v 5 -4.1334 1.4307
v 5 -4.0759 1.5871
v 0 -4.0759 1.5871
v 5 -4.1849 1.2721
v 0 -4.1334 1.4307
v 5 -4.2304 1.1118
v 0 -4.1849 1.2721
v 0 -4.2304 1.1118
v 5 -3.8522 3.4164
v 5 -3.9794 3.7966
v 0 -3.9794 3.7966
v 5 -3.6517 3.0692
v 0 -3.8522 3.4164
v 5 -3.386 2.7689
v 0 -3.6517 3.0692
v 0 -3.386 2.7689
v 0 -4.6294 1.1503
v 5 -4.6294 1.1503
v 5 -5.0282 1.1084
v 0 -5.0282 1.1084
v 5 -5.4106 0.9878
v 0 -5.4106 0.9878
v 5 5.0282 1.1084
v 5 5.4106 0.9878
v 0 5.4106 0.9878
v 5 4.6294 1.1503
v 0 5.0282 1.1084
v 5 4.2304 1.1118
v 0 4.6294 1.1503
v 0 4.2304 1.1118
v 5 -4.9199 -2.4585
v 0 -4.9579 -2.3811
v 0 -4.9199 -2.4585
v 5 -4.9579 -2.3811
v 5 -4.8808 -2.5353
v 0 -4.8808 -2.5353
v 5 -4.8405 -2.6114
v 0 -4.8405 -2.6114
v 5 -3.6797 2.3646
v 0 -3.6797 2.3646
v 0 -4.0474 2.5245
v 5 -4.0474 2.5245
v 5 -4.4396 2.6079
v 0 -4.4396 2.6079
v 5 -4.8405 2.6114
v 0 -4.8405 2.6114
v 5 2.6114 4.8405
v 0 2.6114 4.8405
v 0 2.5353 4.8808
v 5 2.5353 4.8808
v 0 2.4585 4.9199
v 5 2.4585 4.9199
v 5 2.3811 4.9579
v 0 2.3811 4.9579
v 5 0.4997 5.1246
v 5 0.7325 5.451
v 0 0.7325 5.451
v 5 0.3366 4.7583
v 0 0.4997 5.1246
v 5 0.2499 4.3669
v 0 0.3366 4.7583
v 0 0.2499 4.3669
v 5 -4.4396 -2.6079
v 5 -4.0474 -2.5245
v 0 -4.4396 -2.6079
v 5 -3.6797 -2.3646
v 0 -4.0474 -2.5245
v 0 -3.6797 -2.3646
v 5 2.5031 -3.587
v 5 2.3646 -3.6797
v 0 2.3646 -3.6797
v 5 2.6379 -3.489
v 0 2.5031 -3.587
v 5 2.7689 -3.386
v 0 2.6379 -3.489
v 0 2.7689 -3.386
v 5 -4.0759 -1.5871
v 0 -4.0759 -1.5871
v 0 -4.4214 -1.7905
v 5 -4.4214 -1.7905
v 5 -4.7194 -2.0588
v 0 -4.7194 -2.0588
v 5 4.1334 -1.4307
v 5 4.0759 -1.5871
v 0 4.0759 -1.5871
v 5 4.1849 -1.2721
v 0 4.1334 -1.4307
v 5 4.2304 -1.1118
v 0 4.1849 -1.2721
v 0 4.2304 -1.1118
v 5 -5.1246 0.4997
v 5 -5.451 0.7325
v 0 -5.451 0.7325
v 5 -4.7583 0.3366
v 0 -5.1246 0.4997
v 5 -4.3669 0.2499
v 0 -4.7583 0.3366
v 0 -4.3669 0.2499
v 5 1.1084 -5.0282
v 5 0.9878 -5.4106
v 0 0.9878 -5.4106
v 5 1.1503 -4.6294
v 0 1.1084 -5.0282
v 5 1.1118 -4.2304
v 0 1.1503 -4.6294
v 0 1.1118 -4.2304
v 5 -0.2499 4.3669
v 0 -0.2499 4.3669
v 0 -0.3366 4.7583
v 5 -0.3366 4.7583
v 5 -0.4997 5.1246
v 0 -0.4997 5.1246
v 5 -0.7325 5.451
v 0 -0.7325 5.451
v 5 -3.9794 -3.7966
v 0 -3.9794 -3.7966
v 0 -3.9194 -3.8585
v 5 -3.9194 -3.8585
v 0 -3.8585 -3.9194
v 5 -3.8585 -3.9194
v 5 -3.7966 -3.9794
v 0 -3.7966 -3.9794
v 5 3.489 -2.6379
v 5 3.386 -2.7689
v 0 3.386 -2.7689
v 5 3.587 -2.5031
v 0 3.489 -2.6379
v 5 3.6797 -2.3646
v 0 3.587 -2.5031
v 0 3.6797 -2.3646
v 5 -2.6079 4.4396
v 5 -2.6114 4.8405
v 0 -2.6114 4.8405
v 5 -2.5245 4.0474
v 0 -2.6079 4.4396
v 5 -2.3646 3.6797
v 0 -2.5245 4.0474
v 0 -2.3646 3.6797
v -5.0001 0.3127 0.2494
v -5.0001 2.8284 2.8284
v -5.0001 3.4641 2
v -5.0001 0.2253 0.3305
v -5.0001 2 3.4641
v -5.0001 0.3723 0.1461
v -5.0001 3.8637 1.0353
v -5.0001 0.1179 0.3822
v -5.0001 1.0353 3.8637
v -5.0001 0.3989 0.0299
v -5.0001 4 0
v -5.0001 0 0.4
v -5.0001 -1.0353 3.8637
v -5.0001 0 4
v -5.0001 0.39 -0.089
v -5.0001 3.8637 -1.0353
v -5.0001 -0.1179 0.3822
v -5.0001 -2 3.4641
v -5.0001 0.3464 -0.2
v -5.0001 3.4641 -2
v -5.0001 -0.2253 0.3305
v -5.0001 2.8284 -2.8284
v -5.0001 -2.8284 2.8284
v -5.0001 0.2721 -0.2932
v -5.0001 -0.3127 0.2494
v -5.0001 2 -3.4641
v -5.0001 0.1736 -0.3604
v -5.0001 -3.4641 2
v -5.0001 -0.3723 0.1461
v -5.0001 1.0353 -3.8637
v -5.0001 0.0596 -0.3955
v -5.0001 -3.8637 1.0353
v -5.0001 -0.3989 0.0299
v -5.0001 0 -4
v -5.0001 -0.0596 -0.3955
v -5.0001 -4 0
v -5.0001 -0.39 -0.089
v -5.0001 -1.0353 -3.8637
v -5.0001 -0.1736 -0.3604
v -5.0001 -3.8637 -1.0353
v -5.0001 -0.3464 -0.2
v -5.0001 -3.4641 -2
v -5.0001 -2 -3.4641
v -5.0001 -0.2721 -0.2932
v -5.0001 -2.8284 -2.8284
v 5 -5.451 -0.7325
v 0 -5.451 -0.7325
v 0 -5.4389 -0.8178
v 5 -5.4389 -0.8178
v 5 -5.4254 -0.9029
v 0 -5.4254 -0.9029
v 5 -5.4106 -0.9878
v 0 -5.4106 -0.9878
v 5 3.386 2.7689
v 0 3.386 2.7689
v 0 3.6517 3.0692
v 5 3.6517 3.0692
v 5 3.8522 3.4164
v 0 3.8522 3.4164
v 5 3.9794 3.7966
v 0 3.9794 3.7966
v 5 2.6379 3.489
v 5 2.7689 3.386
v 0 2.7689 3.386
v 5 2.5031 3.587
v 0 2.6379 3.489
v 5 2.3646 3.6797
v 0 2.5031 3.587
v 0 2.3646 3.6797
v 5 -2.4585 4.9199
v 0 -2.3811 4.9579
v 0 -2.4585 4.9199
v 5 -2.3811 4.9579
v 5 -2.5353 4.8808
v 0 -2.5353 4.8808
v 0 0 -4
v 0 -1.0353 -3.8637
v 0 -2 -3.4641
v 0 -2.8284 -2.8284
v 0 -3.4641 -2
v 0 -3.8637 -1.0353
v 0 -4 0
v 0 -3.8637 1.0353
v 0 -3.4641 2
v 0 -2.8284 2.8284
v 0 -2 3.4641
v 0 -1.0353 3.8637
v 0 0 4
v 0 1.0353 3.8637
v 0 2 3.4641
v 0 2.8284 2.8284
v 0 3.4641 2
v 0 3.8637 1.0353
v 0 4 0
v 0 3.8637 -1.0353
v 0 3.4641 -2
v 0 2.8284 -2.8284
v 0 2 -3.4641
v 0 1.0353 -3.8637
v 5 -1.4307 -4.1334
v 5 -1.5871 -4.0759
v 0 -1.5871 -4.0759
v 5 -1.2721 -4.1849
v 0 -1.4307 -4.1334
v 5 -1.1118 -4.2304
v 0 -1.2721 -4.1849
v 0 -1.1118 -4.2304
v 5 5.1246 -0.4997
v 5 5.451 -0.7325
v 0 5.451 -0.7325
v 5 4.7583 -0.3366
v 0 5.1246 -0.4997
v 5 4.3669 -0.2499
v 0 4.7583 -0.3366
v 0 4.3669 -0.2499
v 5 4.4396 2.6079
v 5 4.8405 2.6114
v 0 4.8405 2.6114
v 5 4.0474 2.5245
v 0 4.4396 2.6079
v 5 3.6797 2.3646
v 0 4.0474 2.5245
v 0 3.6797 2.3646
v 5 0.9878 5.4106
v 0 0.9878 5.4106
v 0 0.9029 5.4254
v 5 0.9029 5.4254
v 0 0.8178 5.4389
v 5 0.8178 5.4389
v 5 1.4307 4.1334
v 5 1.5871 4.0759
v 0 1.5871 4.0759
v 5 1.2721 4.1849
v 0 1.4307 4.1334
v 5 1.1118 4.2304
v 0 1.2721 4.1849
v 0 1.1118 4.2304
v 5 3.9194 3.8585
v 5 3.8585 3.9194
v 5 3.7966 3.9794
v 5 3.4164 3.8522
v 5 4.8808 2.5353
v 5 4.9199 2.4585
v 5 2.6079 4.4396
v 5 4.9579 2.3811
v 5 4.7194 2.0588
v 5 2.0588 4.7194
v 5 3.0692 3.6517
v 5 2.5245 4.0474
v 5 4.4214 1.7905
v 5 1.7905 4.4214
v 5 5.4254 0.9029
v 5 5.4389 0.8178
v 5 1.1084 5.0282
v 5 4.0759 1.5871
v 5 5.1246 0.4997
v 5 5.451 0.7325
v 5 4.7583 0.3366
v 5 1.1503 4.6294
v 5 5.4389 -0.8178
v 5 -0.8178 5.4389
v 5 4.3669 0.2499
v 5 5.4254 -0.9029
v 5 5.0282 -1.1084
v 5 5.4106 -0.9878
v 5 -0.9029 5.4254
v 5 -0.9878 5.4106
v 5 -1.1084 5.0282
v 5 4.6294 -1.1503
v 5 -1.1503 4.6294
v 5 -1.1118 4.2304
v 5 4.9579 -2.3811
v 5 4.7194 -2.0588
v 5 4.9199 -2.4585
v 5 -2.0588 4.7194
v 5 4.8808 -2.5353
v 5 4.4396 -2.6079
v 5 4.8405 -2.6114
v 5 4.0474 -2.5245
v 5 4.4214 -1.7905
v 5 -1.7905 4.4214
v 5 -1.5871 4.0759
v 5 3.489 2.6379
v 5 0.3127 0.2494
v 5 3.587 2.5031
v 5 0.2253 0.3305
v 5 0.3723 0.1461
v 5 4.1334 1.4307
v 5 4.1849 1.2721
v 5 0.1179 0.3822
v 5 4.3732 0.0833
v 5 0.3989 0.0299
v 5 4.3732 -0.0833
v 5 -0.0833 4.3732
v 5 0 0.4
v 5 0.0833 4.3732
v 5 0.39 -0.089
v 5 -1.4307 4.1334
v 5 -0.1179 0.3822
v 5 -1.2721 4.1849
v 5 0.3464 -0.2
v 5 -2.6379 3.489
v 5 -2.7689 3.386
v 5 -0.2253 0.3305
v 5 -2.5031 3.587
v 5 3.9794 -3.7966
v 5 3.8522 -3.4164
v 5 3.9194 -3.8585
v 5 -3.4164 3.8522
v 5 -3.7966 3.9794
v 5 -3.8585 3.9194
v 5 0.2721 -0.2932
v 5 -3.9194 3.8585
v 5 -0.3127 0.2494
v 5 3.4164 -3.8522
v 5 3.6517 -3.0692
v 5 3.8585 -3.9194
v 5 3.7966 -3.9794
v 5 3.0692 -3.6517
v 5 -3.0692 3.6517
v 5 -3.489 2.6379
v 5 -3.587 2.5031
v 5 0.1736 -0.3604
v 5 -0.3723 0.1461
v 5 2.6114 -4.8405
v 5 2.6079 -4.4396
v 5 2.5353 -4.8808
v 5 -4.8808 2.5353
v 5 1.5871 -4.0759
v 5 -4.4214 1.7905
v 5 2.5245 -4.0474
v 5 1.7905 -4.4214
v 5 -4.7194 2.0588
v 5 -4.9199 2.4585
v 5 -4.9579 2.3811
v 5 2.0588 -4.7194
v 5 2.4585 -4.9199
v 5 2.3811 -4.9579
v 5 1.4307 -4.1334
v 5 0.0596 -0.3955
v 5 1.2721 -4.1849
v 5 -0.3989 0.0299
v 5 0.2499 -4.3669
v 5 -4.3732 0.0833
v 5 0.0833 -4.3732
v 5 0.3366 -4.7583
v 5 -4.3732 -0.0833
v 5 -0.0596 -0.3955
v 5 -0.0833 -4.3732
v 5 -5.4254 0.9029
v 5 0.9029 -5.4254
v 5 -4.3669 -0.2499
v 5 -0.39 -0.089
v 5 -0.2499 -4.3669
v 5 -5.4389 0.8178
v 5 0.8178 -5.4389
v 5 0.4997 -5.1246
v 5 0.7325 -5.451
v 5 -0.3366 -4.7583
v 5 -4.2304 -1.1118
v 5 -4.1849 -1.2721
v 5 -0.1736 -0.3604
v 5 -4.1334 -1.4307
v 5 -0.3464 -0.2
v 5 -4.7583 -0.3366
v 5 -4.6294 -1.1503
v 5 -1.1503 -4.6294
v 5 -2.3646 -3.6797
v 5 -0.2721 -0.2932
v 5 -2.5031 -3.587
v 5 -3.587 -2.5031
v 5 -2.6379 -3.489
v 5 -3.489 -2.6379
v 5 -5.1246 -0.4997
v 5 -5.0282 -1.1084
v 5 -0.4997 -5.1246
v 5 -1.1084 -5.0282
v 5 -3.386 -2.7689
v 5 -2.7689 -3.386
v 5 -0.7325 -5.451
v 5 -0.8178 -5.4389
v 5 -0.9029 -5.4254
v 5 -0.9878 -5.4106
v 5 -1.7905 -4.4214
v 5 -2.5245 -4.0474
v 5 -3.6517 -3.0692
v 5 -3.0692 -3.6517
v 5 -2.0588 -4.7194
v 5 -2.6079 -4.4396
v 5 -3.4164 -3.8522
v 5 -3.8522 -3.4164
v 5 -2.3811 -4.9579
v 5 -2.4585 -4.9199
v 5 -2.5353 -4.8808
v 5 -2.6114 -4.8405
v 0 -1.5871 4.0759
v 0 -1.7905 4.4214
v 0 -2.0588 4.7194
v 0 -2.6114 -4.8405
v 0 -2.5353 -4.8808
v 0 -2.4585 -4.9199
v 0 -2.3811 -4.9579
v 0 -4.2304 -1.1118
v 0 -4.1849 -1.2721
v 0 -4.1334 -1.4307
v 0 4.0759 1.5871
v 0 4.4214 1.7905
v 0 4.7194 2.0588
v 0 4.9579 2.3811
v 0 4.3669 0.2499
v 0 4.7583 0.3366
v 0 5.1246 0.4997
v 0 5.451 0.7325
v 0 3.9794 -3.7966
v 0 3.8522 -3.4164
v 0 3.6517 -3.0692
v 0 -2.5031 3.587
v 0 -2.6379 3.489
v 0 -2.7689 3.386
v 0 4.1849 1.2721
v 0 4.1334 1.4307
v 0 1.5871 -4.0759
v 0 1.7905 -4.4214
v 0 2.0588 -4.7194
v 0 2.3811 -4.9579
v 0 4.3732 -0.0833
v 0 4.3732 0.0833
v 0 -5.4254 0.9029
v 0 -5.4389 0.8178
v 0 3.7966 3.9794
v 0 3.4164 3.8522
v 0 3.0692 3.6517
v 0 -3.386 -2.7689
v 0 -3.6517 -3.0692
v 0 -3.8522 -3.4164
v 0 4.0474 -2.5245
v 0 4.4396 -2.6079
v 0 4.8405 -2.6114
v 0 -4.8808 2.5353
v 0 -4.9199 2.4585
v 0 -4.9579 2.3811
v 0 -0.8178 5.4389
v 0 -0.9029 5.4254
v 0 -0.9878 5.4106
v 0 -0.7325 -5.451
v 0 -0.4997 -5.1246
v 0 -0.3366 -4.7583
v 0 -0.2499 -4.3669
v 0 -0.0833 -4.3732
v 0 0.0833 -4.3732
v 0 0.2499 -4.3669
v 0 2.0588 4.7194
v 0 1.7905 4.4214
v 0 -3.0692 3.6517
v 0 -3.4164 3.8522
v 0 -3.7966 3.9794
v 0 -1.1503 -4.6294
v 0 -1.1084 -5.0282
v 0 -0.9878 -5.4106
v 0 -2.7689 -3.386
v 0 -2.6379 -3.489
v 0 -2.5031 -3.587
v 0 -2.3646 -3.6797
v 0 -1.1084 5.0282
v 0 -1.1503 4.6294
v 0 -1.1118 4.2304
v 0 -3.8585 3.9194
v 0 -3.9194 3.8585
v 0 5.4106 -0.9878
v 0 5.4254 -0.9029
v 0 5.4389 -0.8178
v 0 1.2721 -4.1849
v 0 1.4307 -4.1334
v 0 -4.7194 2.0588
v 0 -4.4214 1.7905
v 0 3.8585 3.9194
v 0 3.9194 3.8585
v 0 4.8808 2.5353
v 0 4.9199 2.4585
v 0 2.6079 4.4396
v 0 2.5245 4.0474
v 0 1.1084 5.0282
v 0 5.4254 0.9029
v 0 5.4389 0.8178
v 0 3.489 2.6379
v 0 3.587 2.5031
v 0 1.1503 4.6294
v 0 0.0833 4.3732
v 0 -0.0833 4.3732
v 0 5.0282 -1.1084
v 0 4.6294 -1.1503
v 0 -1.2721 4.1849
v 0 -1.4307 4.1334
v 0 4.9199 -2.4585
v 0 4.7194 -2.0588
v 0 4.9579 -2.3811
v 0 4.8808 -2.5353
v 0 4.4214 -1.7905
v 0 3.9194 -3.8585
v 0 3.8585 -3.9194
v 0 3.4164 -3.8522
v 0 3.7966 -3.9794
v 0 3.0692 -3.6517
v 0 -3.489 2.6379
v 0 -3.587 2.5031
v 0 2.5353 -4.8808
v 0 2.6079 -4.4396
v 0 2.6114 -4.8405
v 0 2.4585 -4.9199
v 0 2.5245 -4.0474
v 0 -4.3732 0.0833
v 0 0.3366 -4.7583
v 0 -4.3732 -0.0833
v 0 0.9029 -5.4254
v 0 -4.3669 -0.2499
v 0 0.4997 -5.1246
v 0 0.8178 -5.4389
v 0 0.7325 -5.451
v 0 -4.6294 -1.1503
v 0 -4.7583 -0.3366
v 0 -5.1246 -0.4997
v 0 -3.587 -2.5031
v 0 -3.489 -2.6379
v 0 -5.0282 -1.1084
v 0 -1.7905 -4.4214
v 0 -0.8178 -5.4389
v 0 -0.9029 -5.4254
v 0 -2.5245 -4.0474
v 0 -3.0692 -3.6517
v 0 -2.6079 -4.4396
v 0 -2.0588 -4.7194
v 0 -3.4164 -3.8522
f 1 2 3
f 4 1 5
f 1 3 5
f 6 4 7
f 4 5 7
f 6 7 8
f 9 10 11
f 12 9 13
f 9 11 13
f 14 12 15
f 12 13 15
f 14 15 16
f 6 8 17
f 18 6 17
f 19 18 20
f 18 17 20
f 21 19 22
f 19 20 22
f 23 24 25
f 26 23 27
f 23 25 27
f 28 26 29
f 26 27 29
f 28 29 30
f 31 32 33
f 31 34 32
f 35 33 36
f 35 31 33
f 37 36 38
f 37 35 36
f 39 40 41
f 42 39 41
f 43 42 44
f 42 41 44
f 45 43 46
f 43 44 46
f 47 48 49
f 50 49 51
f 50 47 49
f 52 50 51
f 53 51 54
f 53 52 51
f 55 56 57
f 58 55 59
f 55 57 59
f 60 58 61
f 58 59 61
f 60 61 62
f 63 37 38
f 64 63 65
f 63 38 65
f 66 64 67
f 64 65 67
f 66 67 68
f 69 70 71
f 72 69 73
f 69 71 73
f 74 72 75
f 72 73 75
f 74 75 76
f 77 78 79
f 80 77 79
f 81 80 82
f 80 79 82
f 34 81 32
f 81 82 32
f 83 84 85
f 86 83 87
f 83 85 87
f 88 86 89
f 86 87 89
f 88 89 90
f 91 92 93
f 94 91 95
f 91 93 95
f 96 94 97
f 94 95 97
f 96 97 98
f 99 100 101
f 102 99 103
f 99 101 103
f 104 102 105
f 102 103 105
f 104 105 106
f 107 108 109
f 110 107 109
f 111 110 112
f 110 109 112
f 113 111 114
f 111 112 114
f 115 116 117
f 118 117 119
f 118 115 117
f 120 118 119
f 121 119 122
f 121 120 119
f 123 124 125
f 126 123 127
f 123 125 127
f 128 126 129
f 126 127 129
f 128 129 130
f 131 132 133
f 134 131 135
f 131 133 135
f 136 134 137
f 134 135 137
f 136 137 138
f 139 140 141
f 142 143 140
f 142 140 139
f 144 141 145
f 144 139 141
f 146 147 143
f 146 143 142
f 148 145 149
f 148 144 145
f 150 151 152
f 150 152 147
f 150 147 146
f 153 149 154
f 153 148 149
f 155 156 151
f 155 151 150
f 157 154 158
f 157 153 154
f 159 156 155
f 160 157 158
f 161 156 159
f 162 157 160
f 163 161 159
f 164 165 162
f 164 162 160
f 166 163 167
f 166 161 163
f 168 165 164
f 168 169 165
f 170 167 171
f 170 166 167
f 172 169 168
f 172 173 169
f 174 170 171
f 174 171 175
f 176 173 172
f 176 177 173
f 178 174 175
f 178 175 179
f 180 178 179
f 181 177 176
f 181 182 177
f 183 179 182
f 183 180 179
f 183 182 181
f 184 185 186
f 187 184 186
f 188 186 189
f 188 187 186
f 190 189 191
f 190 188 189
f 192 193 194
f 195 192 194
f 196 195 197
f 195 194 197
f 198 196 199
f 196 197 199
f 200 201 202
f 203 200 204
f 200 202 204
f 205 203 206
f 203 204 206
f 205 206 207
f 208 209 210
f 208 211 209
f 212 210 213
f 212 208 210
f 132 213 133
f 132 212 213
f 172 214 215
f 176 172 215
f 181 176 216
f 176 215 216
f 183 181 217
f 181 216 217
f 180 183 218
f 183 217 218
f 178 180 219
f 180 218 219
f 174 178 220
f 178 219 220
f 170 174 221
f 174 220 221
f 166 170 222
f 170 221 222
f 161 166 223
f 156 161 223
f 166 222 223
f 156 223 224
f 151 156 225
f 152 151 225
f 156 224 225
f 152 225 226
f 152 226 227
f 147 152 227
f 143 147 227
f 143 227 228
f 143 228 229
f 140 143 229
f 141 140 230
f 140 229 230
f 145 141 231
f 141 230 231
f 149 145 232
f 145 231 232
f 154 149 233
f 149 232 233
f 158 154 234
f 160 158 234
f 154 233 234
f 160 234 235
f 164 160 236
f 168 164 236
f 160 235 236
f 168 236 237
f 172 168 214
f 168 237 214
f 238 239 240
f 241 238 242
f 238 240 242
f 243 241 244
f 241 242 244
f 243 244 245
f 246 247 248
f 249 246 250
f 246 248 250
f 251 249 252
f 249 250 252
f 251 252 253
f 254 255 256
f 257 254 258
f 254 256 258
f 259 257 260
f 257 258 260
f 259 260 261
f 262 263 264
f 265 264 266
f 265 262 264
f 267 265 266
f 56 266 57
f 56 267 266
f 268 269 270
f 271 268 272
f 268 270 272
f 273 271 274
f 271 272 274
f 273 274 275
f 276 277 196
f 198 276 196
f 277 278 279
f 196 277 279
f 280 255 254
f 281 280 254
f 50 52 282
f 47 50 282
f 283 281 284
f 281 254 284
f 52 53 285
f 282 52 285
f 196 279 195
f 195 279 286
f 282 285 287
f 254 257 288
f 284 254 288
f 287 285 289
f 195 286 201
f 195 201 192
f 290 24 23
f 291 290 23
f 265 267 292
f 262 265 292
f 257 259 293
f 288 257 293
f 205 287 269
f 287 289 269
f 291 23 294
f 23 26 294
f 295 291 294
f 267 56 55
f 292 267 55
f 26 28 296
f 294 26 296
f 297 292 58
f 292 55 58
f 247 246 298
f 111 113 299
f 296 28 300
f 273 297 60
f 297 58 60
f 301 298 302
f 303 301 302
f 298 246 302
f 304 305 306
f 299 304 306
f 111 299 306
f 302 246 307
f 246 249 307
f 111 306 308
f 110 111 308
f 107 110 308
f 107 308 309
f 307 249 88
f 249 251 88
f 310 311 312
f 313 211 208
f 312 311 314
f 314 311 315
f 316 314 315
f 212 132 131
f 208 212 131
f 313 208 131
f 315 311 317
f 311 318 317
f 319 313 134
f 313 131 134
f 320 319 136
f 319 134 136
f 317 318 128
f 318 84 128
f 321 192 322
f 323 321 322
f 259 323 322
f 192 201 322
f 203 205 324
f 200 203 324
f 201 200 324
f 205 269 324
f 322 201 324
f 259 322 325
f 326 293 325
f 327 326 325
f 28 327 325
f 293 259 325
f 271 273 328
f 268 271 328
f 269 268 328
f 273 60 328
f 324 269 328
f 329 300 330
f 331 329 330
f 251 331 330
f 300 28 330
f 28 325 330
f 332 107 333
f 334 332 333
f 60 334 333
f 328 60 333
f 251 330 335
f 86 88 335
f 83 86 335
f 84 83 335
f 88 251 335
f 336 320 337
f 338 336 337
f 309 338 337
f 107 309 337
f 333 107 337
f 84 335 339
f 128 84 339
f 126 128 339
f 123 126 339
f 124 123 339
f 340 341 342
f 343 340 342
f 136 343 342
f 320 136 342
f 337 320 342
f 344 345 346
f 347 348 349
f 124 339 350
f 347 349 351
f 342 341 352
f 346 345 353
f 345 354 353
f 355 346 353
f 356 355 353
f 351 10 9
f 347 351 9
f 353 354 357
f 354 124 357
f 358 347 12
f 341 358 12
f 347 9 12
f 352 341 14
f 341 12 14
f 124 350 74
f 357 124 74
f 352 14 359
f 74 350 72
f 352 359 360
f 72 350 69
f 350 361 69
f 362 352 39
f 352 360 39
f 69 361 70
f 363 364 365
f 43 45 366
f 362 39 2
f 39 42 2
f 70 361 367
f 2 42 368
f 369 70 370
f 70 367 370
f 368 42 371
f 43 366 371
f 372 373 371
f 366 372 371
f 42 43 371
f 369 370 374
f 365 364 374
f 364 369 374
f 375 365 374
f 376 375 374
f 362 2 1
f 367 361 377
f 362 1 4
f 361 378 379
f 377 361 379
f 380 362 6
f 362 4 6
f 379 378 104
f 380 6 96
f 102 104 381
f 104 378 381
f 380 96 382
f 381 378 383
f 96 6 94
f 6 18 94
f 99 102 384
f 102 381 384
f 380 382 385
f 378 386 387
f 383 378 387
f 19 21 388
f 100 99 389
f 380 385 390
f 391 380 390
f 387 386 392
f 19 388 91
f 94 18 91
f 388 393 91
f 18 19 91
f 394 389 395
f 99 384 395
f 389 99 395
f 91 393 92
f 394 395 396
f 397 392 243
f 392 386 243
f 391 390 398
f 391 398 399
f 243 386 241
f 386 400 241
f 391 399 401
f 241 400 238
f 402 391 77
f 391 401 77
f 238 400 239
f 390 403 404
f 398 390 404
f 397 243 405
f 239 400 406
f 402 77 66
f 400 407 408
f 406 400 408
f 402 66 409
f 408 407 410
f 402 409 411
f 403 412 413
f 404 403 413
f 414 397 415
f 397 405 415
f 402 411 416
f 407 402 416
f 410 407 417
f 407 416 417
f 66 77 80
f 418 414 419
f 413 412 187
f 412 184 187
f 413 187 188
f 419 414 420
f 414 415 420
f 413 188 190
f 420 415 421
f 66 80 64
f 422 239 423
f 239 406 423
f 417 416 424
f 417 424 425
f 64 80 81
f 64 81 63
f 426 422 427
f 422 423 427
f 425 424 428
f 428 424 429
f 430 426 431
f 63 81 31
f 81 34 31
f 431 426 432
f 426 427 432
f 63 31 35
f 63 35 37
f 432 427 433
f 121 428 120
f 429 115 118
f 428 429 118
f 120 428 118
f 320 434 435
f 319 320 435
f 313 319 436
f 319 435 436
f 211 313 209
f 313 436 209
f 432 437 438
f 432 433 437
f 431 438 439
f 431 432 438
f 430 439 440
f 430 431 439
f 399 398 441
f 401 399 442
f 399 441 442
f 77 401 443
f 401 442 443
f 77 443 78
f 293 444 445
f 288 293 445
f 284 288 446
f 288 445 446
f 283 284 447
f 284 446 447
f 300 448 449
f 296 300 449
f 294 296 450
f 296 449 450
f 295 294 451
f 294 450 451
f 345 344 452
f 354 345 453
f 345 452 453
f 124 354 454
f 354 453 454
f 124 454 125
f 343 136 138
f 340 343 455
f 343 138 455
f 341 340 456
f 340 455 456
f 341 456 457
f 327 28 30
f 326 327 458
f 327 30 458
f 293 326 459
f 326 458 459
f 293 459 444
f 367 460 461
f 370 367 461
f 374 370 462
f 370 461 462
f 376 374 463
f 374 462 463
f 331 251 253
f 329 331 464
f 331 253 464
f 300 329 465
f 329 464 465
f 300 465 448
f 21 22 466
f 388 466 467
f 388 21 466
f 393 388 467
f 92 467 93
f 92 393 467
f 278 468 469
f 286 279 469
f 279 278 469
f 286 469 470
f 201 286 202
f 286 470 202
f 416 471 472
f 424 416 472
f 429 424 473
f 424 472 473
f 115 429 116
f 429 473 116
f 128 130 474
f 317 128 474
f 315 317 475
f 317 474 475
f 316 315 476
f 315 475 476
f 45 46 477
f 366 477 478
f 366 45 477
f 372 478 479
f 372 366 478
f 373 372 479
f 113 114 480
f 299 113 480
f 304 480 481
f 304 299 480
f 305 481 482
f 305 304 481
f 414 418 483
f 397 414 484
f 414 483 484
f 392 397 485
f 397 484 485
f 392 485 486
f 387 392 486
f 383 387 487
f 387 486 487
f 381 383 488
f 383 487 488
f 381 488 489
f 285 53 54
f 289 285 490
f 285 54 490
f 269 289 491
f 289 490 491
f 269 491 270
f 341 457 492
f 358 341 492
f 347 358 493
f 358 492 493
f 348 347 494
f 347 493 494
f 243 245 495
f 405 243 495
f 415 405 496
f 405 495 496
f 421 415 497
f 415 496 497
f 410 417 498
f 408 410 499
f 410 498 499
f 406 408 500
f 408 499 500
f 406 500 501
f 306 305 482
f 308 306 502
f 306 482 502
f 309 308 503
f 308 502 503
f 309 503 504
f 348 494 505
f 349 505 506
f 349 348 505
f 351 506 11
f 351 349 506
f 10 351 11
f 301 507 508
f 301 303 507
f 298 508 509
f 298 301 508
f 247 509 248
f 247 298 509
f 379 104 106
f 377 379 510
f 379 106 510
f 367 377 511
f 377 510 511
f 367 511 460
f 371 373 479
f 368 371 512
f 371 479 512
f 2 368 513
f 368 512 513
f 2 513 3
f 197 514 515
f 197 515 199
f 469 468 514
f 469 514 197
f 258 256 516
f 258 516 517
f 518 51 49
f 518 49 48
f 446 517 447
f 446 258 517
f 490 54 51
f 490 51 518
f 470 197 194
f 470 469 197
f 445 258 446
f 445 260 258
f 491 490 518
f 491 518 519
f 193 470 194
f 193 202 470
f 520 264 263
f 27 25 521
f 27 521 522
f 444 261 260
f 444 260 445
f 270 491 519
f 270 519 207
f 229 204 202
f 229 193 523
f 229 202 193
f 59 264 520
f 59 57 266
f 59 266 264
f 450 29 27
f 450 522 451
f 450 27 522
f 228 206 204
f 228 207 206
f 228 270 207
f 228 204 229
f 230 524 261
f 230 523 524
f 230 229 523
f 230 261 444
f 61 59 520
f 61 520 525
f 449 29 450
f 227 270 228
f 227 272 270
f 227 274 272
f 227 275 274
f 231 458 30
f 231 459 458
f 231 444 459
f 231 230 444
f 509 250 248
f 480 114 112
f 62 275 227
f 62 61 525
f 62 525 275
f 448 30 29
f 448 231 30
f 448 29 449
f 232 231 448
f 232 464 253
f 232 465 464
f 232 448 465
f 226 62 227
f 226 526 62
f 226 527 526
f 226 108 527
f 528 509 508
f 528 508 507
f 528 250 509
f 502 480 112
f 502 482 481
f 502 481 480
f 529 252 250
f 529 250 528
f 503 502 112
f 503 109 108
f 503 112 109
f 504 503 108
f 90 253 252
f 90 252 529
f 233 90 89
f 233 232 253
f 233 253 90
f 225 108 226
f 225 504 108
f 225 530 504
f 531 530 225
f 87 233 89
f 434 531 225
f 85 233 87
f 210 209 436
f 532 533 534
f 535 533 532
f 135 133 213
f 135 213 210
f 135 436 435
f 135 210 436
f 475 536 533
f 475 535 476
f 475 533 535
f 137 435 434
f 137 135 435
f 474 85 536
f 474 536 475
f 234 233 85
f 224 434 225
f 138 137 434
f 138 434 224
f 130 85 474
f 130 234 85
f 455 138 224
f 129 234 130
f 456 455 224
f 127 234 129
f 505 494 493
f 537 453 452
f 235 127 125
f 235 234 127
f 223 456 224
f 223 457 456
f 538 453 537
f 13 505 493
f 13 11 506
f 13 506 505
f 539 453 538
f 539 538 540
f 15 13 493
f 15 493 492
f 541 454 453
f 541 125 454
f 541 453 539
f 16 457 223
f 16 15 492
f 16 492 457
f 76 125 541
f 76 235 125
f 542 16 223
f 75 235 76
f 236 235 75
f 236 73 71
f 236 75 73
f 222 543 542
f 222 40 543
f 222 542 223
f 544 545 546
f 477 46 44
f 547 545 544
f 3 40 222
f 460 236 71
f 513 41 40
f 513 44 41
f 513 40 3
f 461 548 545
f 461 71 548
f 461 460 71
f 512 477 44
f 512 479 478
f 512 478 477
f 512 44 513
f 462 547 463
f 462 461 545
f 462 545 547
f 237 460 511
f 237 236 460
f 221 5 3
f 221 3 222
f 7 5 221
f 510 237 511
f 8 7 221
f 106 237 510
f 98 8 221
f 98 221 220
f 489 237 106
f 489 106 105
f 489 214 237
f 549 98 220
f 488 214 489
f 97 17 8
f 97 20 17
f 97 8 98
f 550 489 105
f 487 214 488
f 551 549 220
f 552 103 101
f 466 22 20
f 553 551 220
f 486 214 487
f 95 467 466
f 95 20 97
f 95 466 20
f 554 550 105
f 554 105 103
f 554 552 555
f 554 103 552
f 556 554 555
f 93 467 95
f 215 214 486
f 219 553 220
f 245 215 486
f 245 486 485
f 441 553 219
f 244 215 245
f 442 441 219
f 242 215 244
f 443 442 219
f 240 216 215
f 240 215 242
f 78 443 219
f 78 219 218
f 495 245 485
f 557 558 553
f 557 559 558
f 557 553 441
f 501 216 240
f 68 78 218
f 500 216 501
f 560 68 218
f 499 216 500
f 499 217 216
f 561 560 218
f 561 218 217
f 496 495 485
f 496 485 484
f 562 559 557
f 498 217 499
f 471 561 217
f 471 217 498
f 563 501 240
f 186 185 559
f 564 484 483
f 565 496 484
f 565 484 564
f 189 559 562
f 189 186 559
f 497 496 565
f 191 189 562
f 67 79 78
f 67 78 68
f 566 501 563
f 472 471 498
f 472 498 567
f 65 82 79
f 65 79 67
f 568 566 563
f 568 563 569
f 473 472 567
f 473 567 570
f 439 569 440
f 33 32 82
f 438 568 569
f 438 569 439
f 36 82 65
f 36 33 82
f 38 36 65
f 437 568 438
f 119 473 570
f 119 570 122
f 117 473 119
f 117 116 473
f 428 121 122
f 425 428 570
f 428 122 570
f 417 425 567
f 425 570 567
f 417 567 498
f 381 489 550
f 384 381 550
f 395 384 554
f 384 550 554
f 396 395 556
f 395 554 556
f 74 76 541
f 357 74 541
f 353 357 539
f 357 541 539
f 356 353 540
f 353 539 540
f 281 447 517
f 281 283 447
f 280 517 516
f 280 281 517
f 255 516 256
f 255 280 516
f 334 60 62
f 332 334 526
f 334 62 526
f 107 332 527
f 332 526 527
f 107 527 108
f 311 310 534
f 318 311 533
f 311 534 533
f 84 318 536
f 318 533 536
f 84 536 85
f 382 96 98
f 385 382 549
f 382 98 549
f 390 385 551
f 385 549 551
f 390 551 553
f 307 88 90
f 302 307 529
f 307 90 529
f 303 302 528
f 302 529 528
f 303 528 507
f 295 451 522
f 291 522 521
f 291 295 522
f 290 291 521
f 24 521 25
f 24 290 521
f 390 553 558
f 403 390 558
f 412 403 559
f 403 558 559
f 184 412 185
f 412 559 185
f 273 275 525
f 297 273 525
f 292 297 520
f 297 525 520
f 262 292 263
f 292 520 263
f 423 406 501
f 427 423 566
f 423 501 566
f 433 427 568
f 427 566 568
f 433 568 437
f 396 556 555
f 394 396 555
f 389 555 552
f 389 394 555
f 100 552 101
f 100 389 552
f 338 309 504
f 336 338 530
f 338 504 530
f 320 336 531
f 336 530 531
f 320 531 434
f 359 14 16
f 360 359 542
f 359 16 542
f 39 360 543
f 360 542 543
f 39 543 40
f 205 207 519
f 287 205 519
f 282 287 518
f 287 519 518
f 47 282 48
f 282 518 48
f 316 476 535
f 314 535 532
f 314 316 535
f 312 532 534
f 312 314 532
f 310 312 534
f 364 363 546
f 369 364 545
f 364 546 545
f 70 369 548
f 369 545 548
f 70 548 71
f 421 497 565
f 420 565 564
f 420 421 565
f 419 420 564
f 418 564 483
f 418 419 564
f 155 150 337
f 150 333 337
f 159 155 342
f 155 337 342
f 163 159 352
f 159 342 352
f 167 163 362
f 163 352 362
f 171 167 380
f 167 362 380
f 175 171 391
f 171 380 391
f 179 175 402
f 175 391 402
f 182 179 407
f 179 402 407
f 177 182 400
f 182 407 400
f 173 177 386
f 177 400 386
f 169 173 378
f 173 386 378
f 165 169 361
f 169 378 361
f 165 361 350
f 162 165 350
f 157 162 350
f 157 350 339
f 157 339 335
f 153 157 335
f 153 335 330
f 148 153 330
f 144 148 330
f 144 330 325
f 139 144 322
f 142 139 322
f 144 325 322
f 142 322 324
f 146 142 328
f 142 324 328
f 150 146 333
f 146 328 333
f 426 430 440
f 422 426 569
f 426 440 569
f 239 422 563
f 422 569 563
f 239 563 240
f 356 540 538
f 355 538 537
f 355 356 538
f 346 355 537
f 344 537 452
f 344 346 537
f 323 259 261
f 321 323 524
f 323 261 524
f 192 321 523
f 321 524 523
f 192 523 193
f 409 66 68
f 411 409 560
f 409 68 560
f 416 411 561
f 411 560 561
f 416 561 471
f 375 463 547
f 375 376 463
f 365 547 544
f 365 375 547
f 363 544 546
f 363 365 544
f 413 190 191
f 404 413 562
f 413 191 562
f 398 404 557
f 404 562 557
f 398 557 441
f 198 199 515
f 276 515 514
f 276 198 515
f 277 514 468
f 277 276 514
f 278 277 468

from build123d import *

# Parameters (mm, degrees)
BASPROSKE_W      = 5
BASPROSKE_H      = 5.5
TOOTHCUT_DEPTH   = 10.246621004
TEETHCUTS_COUNT  = 20
TEETHCUTS_ANGLE  = 342
HUBNEAONESKE_R   = 4
HUBNEARONE_DEPTH = 5.0000508
BORSKE_R         = 0.4
BORE_DEPTH       = 10.0000508


with BuildPart() as part:
    # BasProSke → Base-Revolve (revolve)
    with BuildSketch(Plane(origin=(0, 0, 0), x_dir=(1, 0, 0), z_dir=(0, 1, 0)), mode=Mode.PRIVATE) as base_revolve_sk:
        with Locations((2.5, 2.75)):
            Rectangle(BASPROSKE_W, BASPROSKE_H)
    revolve(base_revolve_sk.sketch.rotate(Axis((-10, 0, 0), (1, 0, 0)), 180), axis=Axis((-10, 0, 0), (1, 0, 0)))

    # TooCutSke → ToothCut (cut, through all)
    with BuildSketch(Plane(origin=(0, 0, 0), x_dir=(0, 0, -1), z_dir=(1, 0, 0))):
        with BuildLine():
            ThreePointArc((0.249903181, 4.366855207), (0, 4.374), (-0.249903181, 4.366855207))
            ThreePointArc((-0.249903181, 4.366855207), (-0.415207844, 4.95951031), (-0.752843848, 5.473871692))
            ThreePointArc((-0.752843848, 5.473871692), (0, 5.5254), (0.752843848, 5.473871692))
            ThreePointArc((0.752843848, 5.473871692), (0.415207844, 4.95951031), (0.249903181, 4.366855207))
        make_face()
    toothcut = extrude(amount=TOOTHCUT_DEPTH, mode=Mode.SUBTRACT)

    # TeethCuts: ToothCut ×20 about axis
    teethcuts_axis = Axis((-10, 0, 0), (1, 0, 0))
    for i in range(1, TEETHCUTS_COUNT):
        add(toothcut.rotate(teethcuts_axis, i * TEETHCUTS_ANGLE / (TEETHCUTS_COUNT - 1)), mode=Mode.SUBTRACT)

    # HubNeaOneSke → HubNearOne (add)
    with BuildSketch(Plane.ZY):
        with Locations(Location((0, 0, 0), (0, 0, 180))):
            Circle(HUBNEAONESKE_R)
    extrude(amount=HUBNEARONE_DEPTH)

    # BorSke → Bore (cut, symmetric)
    with BuildSketch(Plane(origin=(0, 0, 0), x_dir=(0, 0, -1), z_dir=(1, 0, 0))):
        with Locations(Location((0, 0, 0), (0, 0, 180))):
            Circle(BORSKE_R)
    extrude(amount=BORE_DEPTH, both=True, mode=Mode.SUBTRACT)


solid = part.part
